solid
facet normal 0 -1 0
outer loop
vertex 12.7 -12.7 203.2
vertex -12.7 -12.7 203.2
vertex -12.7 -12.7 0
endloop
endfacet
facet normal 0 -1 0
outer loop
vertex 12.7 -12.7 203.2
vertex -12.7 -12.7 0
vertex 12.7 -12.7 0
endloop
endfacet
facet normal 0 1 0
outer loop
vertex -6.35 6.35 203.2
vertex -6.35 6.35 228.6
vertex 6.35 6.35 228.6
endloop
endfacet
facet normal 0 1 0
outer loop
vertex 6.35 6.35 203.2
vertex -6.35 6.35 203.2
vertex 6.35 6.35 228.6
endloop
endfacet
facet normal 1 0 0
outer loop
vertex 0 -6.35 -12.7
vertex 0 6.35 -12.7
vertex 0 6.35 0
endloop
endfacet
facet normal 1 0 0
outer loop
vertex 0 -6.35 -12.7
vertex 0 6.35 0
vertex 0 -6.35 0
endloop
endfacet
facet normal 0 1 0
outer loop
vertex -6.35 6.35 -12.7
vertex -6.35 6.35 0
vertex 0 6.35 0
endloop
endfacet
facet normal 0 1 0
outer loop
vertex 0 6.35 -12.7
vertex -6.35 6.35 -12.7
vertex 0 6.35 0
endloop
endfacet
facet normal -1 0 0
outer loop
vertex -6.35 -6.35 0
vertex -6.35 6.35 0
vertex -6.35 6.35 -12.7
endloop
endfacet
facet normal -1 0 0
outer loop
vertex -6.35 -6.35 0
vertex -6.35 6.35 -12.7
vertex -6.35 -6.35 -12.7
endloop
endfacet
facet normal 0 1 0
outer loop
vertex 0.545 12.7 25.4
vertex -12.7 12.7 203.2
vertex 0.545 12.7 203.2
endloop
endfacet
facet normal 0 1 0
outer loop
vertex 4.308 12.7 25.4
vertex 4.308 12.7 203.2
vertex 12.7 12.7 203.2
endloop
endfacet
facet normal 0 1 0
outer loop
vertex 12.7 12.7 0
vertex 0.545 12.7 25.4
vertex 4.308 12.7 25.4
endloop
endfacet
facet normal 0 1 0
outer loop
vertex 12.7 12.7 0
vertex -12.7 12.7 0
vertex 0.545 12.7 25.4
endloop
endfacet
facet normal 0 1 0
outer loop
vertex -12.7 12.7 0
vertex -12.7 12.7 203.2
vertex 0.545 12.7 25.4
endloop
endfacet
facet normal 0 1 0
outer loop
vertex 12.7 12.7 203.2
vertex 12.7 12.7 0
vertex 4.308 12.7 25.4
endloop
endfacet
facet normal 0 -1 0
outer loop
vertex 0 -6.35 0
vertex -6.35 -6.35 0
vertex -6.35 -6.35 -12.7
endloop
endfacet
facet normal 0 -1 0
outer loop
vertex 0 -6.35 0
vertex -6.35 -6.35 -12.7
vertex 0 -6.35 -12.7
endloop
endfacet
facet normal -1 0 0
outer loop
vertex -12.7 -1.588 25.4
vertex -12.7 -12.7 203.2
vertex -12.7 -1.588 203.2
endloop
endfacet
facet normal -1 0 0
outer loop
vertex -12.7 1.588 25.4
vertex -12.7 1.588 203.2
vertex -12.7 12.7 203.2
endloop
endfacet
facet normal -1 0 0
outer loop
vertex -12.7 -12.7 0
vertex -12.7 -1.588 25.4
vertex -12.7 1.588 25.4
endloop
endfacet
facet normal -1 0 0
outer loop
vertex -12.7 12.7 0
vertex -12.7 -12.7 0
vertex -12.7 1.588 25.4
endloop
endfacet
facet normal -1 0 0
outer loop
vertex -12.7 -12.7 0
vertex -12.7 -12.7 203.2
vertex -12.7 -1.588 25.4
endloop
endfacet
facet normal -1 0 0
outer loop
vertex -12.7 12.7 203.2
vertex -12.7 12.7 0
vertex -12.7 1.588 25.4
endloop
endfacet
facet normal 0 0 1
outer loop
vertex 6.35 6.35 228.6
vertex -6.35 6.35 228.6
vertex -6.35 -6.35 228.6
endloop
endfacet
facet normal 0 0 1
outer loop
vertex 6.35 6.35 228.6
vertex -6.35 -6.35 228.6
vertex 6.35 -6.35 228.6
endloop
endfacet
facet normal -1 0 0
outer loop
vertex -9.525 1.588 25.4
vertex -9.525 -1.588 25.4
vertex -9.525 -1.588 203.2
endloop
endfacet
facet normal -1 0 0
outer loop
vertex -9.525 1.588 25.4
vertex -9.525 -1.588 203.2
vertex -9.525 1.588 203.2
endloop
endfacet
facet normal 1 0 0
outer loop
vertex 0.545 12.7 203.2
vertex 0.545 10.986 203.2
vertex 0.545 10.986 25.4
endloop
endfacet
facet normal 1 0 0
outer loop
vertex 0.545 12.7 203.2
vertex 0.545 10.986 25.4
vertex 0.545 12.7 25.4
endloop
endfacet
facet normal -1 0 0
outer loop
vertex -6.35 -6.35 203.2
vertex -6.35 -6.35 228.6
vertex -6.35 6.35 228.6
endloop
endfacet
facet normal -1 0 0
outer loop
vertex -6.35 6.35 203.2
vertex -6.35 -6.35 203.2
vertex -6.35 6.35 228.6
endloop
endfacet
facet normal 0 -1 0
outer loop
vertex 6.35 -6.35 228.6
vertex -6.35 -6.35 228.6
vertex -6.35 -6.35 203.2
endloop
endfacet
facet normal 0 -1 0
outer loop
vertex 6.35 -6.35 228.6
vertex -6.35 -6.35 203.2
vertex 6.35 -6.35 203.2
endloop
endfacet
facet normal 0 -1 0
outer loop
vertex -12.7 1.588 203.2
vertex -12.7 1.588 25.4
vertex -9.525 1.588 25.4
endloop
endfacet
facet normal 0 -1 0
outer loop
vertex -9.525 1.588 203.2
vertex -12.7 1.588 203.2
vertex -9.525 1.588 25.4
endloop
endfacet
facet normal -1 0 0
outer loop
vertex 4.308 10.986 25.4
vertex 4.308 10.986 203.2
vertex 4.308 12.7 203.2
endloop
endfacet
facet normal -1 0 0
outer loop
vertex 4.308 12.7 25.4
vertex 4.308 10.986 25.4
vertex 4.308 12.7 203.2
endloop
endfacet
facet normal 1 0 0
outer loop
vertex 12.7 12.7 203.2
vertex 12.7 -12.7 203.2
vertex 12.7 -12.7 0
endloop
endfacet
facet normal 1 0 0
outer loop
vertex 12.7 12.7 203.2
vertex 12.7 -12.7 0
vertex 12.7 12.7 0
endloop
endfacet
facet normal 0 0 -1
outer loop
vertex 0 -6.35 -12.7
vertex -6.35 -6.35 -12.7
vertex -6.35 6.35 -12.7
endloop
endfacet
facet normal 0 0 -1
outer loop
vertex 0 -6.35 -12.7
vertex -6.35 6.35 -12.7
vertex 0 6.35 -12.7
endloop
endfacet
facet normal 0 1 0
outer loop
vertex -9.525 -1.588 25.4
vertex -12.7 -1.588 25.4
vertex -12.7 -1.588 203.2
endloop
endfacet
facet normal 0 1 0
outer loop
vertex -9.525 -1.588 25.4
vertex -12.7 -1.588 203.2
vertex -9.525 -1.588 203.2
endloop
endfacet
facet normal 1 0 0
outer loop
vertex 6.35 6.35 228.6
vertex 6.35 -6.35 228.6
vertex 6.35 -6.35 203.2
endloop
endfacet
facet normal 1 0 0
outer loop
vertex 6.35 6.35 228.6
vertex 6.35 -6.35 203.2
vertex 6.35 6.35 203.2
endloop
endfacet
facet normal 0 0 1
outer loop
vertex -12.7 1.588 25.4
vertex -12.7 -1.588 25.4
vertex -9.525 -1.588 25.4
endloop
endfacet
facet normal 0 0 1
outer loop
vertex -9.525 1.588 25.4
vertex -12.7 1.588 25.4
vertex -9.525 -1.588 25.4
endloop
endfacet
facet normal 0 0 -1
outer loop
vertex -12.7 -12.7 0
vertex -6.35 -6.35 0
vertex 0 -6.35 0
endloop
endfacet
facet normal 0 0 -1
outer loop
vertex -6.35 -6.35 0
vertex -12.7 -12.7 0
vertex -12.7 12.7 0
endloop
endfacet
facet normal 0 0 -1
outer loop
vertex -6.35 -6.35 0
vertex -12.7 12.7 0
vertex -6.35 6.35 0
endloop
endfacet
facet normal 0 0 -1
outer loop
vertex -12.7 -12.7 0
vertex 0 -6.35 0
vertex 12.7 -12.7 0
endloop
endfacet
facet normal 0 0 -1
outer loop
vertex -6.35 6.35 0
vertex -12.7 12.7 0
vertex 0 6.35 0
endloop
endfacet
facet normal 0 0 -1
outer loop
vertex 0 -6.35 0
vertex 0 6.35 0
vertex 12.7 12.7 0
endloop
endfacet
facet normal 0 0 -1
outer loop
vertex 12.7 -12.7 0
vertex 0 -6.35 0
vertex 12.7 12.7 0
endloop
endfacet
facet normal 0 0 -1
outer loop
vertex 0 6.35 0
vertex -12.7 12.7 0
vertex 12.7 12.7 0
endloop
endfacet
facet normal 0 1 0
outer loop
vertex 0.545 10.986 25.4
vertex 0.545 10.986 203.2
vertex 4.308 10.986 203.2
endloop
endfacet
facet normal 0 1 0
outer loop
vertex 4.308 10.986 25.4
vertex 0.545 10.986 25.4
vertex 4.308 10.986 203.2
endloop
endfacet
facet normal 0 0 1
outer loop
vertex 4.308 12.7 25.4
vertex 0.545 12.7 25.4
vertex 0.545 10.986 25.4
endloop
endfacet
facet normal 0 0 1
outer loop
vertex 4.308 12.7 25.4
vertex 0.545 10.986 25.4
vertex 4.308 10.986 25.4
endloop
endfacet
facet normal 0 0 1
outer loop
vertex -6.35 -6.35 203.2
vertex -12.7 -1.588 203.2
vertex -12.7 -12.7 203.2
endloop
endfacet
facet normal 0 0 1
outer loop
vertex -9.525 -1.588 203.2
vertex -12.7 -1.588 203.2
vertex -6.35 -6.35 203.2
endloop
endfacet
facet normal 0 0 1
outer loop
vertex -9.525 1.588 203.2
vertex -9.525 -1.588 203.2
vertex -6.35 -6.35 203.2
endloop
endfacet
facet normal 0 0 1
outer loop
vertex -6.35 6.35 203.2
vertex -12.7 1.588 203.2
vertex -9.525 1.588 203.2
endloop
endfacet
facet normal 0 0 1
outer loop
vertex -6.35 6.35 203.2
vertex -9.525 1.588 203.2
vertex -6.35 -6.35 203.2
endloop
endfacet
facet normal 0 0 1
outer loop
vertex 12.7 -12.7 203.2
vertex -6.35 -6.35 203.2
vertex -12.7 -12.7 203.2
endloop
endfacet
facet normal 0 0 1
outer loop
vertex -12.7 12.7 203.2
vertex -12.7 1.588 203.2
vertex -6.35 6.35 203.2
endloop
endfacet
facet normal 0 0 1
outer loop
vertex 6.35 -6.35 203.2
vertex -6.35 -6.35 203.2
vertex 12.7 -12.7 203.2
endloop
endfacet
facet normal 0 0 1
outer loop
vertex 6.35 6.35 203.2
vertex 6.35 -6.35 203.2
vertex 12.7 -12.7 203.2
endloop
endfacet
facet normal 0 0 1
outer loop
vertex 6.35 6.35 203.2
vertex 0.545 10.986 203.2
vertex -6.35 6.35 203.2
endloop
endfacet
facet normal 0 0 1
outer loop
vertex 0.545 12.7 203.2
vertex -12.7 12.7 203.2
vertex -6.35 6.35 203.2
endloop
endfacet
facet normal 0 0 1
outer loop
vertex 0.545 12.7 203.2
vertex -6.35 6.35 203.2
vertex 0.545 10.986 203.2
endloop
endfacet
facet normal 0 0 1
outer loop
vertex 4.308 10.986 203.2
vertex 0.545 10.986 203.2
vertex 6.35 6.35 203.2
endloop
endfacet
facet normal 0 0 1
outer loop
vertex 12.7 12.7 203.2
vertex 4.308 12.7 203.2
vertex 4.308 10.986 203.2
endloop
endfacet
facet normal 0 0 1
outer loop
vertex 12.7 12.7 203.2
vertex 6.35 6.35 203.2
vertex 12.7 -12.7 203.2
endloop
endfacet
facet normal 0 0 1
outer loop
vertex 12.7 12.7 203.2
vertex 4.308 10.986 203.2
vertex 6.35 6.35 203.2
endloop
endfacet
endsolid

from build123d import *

# Parameters (mm, degrees)
F0_W     = 25.4
F0_H     = 25.4
F1_DEPTH = 203.2
F2_W     = 12.7
F2_H     = 12.7
F3_DEPTH = 12.7
F4_W     = 6.35
F4_H     = 12.7
F5_DEPTH = 12.7
F6_W     = 3.762882
F6_H     = 3.762882
F6_W_2   = 3.175
F6_H_2   = 3.175
F7_DEPTH = 177.8
F8_W     = 12.7
F8_H     = 12.7
F9_DEPTH = 25.4


with BuildPart() as f1:
    # F0 (on Top) → F1 (new body)
    with BuildSketch(Plane.XY):
        Rectangle(F0_W, F0_H)
    extrude(amount=F1_DEPTH)

    # F2 (on face) → F3 (join)
    with BuildSketch(Plane(origin=(0, 0, 0), x_dir=(1, 0, 0), z_dir=(0, 0, -1))):
        Rectangle(F2_W, F2_H)
    extrude(amount=F3_DEPTH)

    # F4 (on face) → F5 (cut)
    with BuildSketch(Plane(origin=(0, 0, -12.7), x_dir=(1, 0, 0), z_dir=(0, 0, -1))):
        with Locations((3.175, 0)):
            Rectangle(F4_W, F4_H)
    extrude(amount=-F5_DEPTH, mode=Mode.SUBTRACT)

    # F6 (on face) → F7 (cut)
    with BuildSketch(Plane.XY.offset(203.2)):
        with Locations((2.426788, 12.867747)):
            Rectangle(F6_W, F6_H)
        with Locations((-11.1125, 0)):
            Rectangle(F6_W_2, F6_H_2)
    extrude(amount=-F7_DEPTH, mode=Mode.SUBTRACT)

    # F8 (on face) → F9 (join)
    with BuildSketch(Plane.XY.offset(203.2)):
        Rectangle(F8_W, F8_H)
    extrude(amount=F9_DEPTH)


solid = f1.part
